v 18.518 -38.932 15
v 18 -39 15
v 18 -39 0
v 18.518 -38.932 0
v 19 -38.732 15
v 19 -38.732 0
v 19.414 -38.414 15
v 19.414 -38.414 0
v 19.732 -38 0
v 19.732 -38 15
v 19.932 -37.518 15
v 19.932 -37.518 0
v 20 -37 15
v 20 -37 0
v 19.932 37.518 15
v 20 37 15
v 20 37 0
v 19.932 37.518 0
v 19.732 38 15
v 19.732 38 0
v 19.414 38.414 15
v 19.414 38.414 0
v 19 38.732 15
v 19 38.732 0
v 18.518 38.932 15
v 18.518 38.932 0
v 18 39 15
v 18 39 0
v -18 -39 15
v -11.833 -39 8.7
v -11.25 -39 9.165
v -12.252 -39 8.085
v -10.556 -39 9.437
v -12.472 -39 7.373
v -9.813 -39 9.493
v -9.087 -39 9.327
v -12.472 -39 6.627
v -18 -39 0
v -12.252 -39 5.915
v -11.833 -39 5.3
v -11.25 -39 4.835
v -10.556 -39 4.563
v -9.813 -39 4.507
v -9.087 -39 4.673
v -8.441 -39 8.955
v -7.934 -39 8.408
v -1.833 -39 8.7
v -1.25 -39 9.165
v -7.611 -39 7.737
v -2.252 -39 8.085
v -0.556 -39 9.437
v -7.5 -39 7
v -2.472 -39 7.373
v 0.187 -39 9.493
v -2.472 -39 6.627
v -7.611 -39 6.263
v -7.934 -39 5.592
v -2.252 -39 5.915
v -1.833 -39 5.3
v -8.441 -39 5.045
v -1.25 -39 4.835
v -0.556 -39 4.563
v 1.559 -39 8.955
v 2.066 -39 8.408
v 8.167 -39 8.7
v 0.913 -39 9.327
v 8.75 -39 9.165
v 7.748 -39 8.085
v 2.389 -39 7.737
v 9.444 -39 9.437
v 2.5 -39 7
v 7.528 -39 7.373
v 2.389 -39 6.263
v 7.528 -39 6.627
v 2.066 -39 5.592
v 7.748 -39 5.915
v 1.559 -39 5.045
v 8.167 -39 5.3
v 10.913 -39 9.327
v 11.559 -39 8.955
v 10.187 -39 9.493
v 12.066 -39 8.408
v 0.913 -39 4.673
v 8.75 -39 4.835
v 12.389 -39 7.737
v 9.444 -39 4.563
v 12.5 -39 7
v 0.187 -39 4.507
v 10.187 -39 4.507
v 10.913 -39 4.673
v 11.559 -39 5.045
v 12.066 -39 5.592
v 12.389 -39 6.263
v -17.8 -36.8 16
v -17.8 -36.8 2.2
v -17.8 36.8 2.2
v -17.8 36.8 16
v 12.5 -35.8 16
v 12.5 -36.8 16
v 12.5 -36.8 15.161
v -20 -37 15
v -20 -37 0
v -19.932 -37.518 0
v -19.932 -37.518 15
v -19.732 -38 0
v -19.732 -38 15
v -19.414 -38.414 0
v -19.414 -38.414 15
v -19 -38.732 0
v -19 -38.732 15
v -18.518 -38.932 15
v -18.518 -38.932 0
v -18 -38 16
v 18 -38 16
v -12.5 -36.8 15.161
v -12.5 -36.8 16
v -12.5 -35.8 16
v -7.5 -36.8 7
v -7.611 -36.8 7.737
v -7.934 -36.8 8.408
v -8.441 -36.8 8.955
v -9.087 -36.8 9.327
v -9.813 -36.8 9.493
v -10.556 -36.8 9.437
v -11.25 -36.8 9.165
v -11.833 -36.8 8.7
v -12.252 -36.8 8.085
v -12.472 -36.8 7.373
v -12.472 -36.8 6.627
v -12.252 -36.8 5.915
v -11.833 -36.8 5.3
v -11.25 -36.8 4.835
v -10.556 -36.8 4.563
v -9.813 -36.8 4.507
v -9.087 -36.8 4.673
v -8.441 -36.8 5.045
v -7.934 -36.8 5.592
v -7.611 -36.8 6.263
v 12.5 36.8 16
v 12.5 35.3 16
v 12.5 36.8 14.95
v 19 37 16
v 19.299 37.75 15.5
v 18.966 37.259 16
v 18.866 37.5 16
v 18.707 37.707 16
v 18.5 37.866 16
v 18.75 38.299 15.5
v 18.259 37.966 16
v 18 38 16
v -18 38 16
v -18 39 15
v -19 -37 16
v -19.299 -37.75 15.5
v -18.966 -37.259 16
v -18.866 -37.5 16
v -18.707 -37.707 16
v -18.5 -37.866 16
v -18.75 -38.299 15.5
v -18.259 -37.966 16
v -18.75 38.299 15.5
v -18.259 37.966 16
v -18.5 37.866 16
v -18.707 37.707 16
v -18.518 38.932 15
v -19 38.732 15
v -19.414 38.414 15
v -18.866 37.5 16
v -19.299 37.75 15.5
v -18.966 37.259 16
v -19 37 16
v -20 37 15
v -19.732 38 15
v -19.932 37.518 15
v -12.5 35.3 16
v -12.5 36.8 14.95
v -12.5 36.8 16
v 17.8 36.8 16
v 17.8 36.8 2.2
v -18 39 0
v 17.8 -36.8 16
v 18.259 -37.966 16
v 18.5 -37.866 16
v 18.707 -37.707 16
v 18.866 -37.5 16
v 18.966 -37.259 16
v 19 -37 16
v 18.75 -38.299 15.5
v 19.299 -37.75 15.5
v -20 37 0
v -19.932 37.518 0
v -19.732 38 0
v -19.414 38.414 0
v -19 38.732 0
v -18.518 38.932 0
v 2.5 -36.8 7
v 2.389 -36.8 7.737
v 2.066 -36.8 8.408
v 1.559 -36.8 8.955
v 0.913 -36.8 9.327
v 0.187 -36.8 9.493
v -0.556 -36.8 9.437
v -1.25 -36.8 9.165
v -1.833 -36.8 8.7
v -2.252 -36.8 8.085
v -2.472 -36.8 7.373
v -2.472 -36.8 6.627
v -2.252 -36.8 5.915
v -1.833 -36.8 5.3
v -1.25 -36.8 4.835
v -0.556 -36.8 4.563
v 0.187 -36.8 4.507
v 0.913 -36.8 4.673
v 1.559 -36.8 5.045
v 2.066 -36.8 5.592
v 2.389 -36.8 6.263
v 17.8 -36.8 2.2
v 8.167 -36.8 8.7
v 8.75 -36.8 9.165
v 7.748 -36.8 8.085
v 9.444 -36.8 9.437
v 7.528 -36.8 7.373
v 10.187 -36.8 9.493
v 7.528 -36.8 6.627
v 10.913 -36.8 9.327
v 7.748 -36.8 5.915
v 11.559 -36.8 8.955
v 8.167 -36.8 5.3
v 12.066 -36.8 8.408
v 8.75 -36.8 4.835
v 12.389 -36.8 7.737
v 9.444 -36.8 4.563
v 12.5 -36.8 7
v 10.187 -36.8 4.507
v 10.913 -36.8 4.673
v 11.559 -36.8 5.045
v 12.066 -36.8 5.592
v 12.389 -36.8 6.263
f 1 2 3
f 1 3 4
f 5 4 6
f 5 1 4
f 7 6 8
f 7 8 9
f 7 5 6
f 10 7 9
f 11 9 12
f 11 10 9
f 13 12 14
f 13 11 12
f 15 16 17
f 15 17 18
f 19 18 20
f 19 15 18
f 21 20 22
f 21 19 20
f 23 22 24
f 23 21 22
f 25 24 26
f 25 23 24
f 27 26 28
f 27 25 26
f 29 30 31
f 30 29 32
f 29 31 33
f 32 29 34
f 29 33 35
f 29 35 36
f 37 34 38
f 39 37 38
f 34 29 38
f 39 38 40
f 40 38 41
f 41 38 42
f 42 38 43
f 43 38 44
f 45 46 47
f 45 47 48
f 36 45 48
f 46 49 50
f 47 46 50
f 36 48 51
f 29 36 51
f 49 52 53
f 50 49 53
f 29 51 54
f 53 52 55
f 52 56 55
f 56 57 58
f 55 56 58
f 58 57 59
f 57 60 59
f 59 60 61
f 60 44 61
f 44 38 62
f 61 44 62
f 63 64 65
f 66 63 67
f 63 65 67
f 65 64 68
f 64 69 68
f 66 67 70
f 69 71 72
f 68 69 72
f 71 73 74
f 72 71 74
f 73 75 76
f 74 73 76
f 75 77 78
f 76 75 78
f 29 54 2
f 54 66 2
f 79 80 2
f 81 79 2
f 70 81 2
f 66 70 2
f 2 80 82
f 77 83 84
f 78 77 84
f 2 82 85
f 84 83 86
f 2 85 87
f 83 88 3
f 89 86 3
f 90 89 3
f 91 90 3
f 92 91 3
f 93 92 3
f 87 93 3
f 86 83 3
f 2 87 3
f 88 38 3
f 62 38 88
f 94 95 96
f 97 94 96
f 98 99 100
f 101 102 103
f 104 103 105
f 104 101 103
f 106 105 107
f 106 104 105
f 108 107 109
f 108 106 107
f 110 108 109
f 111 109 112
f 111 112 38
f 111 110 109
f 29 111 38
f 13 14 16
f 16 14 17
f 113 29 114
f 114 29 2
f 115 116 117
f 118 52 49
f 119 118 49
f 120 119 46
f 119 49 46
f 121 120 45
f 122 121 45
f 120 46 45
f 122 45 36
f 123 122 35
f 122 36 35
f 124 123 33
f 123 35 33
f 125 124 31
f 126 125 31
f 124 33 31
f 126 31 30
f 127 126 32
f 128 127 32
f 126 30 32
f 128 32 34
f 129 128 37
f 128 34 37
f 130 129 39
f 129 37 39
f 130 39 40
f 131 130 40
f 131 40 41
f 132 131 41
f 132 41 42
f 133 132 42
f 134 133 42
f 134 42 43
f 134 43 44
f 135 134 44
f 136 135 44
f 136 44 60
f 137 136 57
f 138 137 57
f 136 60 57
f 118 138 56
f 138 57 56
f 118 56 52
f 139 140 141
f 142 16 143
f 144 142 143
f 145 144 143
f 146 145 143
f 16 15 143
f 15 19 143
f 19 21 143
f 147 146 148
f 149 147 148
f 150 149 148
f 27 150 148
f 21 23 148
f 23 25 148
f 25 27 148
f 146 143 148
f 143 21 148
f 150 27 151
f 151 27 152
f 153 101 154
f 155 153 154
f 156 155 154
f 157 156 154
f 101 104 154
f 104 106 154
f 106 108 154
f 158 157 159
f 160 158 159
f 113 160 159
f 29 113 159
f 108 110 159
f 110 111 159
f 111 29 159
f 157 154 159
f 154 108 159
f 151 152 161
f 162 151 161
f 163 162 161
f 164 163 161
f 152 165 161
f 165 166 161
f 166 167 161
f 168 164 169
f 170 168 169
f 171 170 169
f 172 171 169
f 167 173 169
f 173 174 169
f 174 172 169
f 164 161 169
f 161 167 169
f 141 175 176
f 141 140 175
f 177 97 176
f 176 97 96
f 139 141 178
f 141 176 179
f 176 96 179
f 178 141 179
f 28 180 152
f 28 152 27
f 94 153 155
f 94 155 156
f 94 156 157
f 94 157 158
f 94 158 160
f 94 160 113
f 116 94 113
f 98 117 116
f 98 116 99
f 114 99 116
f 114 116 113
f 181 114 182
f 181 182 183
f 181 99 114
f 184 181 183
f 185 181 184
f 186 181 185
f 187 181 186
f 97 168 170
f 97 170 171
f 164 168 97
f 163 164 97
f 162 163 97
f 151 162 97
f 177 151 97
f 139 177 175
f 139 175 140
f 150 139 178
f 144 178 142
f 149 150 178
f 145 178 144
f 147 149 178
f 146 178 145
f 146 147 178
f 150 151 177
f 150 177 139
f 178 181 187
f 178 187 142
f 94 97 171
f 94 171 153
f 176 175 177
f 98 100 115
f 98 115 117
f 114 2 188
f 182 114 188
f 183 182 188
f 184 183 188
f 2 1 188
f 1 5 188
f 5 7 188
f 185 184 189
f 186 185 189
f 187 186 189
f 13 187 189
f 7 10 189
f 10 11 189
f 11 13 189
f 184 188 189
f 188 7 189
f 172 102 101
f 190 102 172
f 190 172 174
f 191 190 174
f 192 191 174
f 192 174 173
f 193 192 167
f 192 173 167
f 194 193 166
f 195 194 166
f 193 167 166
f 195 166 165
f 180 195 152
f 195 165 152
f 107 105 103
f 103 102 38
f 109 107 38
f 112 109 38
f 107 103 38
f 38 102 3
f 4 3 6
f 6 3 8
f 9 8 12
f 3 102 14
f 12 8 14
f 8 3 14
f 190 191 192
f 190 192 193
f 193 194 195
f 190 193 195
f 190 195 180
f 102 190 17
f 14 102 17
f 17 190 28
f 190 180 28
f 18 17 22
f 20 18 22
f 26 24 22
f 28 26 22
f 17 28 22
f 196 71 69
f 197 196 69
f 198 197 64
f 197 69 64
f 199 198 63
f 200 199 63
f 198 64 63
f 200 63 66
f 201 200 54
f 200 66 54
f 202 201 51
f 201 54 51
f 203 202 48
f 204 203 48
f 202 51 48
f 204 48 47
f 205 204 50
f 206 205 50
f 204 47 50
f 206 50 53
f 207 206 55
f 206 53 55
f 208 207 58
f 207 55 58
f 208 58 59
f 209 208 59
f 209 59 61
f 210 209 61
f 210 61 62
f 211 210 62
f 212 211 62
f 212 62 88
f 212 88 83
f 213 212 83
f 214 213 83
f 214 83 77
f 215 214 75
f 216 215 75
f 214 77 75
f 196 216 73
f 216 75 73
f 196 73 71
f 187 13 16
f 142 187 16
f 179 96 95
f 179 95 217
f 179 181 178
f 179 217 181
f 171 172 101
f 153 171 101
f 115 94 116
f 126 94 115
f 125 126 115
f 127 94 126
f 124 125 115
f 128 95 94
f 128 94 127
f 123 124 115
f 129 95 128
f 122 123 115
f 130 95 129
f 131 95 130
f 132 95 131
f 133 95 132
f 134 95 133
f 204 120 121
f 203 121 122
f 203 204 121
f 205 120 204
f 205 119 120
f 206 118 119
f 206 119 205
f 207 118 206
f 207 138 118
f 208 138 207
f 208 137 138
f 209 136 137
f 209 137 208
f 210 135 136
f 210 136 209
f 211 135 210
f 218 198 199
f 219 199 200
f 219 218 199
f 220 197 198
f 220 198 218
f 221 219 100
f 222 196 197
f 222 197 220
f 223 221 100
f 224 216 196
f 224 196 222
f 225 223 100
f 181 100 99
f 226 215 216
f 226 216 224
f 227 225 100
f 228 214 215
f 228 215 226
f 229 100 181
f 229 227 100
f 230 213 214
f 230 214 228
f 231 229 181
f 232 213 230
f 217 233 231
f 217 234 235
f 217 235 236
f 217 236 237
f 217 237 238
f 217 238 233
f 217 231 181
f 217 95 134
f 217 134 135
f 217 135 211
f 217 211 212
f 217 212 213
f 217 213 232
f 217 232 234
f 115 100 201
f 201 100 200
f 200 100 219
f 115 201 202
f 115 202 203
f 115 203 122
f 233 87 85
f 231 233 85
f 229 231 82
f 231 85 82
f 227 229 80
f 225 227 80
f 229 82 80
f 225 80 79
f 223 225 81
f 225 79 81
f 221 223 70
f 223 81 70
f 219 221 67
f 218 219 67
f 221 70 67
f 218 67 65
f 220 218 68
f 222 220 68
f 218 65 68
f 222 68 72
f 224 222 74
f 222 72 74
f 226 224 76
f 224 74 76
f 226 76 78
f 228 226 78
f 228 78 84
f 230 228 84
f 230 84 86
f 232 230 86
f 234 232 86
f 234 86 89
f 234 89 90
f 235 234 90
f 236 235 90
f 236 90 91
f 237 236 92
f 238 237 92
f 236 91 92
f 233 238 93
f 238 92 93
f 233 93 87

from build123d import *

# Parameters (mm, degrees)
F0_W     = 40
F0_H     = 78
F1_DEPTH = 16
F2_R     = 2
F3_T     = -2.2
F4_R     = 2.5
F5_DEPTH = 2.2
F7_DEPTH = 12.5
F8_SIZE  = 1


with BuildPart() as f1:
    # F0 (on Top) → F1 (new body)
    with BuildSketch(Plane.XY):
        Rectangle(F0_W, F0_H)
    extrude(amount=F1_DEPTH)

    # F2
    f2_edges = [f1.edges().sort_by_distance(p)[0] for p in [
        (-20, -39, 8),
        (20, -39, 8),
        (-20, 39, 8),
        (20, 39, 8),
    ]]
    fillet(f2_edges, radius=F2_R)

    # F3
    f3_openings = [f1.faces().sort_by_distance(p)[0] for p in [
        (0, 0, 16),
    ]]
    offset(amount=F3_T, openings=f3_openings)

    # F4 (on face) → F5 (cut, through all)
    with BuildSketch(Plane.XZ.offset(39)):
        with Locations((-10, 7)):
            Circle(F4_R)
        with Locations((0, 7)):
            Circle(F4_R)
        with Locations((10, 7)):
            Circle(F4_R)
    extrude(amount=-F5_DEPTH, mode=Mode.SUBTRACT)

    # F6 (on Right) → F7 (join, symmetric)
    with BuildSketch(Plane.YZ):
        Polygon((-36.8, 16), (-36.8, 15.1609003688), (-35.8, 16), align=None)
        Polygon((35.3, 16), (36.8, 14.9496886927), (36.8, 16), align=None)
    extrude(amount=F7_DEPTH, both=True)

    # F8
    f8_edges = [f1.edges().sort_by_distance(p)[0] for p in [
        (0, -39, 16),
    ]]
    chamfer(f8_edges, length=F8_SIZE)


solid = f1.part
